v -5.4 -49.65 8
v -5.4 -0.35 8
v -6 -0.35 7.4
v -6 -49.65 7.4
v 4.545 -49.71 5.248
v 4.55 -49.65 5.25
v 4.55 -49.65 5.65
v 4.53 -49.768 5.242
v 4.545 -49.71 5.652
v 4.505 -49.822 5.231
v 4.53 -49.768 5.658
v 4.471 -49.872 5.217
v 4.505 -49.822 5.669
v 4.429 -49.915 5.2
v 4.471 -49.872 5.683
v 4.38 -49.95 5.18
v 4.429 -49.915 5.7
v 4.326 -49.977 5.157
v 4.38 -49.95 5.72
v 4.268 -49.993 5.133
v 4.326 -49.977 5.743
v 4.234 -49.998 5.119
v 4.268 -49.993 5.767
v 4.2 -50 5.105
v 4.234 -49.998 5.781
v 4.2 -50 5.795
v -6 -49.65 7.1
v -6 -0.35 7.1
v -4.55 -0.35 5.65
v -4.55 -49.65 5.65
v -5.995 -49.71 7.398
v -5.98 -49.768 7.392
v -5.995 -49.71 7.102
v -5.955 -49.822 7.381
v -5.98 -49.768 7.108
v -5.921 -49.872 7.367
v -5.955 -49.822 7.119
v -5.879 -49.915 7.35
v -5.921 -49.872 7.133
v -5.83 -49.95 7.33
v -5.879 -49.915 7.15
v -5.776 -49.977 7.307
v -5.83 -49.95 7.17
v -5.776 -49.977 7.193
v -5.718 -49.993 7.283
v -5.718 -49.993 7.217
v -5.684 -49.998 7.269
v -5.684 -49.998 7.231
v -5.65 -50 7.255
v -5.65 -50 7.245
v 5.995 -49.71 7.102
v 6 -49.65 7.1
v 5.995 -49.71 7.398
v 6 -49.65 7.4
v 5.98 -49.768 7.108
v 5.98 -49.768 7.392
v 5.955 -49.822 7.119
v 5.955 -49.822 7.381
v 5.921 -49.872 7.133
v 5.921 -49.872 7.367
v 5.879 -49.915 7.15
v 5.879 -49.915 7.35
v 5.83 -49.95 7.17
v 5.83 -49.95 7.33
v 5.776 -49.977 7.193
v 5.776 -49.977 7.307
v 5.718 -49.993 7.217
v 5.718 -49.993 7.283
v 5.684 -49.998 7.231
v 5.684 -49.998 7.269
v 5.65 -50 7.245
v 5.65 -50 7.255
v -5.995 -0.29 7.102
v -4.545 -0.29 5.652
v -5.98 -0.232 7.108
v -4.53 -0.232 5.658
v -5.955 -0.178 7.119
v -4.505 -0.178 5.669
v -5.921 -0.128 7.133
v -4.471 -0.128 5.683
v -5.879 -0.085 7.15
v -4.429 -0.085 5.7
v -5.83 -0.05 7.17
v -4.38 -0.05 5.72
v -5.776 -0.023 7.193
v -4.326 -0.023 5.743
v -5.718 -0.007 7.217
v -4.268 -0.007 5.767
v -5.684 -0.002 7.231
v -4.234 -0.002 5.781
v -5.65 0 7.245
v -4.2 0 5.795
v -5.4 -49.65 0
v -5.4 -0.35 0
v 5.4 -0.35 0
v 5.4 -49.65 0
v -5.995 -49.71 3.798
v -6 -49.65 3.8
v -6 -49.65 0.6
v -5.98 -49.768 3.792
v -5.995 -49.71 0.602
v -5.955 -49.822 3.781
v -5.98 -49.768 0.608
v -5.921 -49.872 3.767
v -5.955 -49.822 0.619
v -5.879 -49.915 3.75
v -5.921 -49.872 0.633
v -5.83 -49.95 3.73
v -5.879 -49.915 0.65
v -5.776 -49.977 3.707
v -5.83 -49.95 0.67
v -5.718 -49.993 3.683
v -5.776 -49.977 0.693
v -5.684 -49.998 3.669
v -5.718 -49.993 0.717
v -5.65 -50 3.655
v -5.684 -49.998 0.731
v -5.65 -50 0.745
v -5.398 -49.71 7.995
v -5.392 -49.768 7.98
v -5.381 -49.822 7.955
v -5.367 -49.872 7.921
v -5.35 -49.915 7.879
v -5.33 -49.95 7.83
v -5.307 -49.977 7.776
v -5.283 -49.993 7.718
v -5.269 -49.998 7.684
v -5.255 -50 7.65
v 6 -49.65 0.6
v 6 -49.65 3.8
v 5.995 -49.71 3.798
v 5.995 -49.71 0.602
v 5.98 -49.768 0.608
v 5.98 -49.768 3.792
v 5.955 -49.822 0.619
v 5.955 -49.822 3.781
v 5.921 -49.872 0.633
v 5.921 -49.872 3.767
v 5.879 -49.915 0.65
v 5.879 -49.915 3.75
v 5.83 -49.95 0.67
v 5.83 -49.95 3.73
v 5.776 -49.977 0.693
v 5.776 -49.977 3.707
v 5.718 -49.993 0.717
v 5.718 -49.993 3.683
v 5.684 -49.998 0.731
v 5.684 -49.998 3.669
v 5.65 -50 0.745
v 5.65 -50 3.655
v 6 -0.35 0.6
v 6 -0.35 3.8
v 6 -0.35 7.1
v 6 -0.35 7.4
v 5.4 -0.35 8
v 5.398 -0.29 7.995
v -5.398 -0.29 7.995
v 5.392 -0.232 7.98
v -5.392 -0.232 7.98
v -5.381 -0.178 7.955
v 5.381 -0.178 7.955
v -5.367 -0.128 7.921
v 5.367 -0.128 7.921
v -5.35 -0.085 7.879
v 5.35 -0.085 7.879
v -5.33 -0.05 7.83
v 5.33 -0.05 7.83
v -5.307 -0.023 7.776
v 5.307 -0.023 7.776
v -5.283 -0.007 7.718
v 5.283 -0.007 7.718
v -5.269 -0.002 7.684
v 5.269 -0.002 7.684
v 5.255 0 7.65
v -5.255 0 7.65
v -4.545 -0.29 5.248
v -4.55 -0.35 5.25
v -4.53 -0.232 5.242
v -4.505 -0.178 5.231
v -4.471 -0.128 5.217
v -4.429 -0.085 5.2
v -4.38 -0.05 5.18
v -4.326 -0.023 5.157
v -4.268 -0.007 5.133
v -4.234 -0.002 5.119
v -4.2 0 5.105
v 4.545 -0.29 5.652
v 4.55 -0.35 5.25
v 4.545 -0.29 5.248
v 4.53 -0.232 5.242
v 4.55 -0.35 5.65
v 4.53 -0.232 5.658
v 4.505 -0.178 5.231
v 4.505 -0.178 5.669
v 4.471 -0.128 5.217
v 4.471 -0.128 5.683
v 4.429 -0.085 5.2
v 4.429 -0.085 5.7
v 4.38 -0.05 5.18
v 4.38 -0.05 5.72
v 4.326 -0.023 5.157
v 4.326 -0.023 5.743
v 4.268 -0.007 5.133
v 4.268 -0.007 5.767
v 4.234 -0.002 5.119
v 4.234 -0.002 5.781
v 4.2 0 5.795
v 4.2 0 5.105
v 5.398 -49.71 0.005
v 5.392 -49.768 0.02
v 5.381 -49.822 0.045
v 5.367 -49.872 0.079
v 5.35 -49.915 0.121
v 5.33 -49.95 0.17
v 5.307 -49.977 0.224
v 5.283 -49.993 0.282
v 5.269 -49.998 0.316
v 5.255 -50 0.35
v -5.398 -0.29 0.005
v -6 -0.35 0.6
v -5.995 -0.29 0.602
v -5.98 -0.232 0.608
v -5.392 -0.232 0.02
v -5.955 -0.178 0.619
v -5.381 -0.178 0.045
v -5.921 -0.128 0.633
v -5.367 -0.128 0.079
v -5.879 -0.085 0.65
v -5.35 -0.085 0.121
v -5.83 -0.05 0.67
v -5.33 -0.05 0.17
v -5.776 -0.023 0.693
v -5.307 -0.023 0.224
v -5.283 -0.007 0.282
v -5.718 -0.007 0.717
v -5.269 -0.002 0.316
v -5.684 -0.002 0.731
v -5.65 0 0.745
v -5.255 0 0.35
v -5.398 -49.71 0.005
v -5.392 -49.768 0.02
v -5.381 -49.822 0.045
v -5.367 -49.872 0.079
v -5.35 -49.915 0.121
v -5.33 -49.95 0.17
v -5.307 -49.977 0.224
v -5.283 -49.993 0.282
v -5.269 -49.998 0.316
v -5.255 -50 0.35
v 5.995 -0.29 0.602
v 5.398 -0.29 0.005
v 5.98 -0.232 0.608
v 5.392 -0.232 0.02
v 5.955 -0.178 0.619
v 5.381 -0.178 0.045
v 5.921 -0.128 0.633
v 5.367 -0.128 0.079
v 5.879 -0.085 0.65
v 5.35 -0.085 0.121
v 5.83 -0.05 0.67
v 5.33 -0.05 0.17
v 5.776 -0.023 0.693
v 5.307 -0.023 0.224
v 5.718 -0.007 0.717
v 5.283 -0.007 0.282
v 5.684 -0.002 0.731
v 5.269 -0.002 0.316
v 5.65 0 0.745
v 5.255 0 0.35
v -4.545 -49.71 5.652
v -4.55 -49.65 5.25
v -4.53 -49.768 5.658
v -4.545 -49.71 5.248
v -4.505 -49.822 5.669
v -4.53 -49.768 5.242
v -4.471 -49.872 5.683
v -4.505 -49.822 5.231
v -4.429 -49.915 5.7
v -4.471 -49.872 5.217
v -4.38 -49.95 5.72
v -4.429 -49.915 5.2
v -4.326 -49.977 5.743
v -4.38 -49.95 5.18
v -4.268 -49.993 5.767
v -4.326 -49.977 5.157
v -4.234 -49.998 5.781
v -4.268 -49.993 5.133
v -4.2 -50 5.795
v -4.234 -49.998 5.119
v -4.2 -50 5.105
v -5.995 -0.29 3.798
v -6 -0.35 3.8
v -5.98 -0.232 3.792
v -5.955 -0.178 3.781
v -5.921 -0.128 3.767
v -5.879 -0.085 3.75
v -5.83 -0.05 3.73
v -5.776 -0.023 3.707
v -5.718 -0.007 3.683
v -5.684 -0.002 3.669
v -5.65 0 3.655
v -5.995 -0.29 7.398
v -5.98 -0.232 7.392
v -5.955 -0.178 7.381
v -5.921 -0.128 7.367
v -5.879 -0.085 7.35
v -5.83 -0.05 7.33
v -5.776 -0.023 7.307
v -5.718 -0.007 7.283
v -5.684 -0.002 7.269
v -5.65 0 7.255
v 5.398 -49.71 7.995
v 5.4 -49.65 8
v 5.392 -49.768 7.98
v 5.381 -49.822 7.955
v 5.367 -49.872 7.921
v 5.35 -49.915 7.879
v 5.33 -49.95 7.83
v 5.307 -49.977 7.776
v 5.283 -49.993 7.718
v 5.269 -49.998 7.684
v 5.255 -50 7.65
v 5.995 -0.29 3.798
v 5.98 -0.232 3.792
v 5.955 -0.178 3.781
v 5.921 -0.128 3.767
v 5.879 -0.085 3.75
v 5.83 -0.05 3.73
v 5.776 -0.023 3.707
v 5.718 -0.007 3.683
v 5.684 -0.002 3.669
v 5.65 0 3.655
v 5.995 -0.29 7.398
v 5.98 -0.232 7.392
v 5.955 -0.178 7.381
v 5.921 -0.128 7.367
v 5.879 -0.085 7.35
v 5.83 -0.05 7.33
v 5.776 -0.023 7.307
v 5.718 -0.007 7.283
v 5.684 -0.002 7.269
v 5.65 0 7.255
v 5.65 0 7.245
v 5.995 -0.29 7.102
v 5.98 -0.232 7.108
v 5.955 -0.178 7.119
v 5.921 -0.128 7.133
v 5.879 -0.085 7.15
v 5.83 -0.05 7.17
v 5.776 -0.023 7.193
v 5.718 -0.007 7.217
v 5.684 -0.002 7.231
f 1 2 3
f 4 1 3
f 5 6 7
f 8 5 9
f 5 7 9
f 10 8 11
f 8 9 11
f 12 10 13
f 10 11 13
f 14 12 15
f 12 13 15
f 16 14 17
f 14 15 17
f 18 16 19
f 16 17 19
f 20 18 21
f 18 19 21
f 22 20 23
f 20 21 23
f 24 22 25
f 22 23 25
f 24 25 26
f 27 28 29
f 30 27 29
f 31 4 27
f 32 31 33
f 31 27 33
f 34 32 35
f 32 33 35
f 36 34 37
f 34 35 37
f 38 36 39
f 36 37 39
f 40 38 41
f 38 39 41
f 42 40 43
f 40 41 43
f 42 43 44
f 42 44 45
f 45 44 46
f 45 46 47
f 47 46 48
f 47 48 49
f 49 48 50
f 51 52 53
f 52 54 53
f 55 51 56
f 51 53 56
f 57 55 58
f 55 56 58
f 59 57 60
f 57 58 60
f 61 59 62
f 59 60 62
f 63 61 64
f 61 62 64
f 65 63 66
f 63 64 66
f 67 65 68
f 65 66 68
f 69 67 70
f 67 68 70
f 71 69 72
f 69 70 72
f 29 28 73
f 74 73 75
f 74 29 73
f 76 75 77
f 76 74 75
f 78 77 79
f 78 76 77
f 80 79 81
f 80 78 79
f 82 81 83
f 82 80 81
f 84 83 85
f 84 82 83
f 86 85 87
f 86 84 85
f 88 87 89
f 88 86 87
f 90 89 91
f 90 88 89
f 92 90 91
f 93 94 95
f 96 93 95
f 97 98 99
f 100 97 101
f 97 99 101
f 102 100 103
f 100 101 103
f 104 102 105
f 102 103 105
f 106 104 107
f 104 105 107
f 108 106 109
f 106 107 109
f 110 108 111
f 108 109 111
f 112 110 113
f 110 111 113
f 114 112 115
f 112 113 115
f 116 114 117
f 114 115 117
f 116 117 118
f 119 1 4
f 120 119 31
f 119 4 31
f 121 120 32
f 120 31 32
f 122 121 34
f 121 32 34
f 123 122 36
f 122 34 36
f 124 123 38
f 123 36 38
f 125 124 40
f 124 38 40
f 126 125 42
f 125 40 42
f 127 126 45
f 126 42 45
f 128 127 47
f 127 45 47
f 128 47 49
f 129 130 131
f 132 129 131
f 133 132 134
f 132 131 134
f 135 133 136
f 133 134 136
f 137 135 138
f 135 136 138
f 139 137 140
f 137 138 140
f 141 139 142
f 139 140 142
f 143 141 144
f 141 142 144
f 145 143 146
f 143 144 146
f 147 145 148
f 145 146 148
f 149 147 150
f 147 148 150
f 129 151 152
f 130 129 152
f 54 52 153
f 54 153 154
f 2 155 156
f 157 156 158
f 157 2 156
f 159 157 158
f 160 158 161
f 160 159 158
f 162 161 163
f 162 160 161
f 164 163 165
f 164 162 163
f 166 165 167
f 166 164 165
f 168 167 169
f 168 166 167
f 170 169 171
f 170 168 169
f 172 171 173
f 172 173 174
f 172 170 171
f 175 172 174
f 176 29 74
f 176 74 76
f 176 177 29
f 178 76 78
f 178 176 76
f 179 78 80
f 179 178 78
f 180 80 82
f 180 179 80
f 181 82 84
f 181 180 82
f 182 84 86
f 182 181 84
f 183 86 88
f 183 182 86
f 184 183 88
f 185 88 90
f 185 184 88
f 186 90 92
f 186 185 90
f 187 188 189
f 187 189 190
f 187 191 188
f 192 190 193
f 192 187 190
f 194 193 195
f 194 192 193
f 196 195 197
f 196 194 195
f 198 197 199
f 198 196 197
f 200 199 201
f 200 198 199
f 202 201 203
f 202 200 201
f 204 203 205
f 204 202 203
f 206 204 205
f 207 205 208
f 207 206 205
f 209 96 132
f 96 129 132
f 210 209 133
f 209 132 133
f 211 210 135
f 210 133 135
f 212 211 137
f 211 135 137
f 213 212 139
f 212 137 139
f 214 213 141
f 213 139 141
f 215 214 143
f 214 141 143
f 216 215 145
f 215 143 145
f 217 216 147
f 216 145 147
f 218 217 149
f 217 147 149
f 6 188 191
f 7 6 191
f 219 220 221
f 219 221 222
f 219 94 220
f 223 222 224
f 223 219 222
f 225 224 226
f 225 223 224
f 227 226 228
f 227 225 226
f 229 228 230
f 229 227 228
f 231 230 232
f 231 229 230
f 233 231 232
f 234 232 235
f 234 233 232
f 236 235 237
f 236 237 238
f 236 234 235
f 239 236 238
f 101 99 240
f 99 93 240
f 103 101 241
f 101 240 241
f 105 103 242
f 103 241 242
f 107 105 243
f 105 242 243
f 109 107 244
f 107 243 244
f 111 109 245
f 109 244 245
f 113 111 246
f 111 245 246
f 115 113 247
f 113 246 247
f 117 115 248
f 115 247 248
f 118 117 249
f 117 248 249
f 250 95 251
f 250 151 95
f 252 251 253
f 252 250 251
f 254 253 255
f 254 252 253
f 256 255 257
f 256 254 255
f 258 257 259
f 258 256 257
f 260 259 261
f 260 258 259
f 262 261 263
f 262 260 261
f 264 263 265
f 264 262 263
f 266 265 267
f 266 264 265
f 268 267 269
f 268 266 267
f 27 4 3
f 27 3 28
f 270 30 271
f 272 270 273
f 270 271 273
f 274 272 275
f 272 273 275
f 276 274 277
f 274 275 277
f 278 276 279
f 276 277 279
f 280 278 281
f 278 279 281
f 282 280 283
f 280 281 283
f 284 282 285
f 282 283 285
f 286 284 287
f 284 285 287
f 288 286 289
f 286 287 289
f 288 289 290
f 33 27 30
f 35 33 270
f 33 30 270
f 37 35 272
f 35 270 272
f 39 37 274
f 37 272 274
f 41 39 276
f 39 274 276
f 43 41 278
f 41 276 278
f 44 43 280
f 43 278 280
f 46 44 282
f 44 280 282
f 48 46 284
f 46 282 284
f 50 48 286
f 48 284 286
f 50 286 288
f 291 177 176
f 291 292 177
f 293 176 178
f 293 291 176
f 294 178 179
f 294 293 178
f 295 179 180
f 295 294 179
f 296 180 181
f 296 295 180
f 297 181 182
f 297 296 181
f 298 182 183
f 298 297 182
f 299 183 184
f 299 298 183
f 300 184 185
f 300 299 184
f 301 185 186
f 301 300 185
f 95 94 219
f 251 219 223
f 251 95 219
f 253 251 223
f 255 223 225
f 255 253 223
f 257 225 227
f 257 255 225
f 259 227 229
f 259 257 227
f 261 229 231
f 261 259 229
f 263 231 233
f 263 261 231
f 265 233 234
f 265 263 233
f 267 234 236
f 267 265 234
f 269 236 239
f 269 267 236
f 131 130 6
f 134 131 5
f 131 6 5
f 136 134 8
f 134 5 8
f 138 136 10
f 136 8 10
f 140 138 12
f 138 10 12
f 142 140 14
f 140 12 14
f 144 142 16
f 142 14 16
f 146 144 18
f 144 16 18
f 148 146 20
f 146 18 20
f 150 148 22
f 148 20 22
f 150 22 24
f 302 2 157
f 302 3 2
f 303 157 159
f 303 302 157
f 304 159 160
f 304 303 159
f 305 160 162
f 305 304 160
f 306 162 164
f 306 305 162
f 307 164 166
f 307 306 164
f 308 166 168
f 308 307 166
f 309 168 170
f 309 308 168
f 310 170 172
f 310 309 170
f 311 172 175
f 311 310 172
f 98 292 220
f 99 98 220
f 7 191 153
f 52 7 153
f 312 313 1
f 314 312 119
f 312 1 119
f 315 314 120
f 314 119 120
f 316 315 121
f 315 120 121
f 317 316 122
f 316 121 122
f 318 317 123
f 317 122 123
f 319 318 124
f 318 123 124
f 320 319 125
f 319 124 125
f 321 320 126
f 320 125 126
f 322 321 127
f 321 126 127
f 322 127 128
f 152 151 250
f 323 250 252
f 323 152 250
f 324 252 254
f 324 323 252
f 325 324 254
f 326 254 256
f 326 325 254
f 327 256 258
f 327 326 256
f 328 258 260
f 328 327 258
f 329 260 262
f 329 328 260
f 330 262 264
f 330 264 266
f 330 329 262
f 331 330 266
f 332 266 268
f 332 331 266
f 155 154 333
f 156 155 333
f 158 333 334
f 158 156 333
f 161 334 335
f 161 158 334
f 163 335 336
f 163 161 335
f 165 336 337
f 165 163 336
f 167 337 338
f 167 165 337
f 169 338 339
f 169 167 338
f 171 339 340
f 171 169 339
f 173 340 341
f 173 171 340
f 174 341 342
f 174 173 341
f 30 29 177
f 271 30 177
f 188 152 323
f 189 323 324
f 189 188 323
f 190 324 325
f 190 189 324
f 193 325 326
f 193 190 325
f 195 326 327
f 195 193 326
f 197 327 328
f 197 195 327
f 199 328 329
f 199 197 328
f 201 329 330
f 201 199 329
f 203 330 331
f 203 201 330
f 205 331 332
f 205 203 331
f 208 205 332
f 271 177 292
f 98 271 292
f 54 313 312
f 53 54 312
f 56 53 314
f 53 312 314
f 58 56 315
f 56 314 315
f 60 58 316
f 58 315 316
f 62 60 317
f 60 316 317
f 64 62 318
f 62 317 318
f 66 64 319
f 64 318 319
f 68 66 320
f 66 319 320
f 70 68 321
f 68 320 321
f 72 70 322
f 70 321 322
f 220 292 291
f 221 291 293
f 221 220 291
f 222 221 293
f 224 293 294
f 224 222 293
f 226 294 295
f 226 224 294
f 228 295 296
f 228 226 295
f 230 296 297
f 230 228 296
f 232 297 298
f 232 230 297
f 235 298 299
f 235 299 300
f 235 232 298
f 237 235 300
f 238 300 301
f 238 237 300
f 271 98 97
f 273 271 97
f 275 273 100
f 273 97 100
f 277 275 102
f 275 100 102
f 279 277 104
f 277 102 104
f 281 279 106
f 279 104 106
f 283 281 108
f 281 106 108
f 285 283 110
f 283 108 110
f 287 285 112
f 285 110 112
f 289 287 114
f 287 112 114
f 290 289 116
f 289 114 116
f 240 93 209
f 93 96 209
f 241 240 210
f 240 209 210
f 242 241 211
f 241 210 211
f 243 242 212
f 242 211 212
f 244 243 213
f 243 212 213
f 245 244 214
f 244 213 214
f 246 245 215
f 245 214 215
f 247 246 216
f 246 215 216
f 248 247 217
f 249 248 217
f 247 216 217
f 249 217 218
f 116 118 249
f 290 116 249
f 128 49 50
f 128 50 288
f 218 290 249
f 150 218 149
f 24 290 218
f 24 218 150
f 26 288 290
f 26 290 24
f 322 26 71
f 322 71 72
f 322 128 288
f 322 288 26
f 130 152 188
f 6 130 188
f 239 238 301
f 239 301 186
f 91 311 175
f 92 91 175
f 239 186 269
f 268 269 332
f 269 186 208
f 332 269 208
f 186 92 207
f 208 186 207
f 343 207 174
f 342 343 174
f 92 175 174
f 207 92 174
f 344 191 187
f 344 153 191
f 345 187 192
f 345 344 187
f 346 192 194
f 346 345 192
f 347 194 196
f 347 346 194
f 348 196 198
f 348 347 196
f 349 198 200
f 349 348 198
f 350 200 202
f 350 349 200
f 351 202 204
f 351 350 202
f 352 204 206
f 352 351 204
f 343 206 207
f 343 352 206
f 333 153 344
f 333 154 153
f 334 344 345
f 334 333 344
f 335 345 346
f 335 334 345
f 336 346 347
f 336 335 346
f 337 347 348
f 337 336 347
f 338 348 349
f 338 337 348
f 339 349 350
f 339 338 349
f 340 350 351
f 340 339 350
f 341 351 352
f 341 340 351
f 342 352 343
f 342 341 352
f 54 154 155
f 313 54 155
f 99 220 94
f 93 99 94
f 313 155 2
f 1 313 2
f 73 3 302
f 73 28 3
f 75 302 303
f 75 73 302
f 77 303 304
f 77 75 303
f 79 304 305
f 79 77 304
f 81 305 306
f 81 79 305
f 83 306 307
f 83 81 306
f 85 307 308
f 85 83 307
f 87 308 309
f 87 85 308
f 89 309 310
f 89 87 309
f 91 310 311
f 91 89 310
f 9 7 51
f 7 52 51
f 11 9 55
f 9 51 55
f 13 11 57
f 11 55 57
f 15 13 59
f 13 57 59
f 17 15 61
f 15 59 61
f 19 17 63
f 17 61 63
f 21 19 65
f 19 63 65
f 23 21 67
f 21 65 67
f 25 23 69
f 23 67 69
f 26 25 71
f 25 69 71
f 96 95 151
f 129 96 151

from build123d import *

# Parameters (mm, degrees)
PAD_DEPTH = 50
FILLET_R  = 0.35


with BuildPart() as part:
    # Sketch → Pad (new body)
    with BuildSketch(Plane.XZ):
        Polygon((-5.4, 0), (5.4, 0), (6, 0.6), (6, 3.8), (4.55, 5.25), (4.55, 5.65), (6, 7.1), (6, 7.4), (5.4, 8), (-5.4, 8), (-6, 7.4), (-6, 7.1), (-4.55, 5.65), (-4.55, 5.25), (-6, 3.8), (-6, 0.6), align=None)
    extrude(amount=PAD_DEPTH)

    # Fillet
    fillet_edges = [part.edges().sort_by_distance(p)[0] for p in [
        (0, 0, 0),
        (5.7, 0, 0.3),
        (6, 0, 2.2),
        (5.275, 0, 4.525),
        (4.55, 0, 5.45),
        (5.275, 0, 6.375),
        (6, 0, 7.25),
        (5.7, 0, 7.7),
        (0, 0, 8),
        (-5.7, 0, 7.7),
        (-6, 0, 7.25),
        (-5.275, 0, 6.375),
        (-4.55, 0, 5.45),
        (-5.275, 0, 4.525),
        (-6, 0, 2.2),
        (-5.7, 0, 0.3),
        (0, -50, 0),
        (5.7, -50, 0.3),
        (6, -50, 2.2),
        (5.275, -50, 4.525),
        (4.55, -50, 5.45),
        (5.275, -50, 6.375),
        (6, -50, 7.25),
        (5.7, -50, 7.7),
        (0, -50, 8),
        (-5.7, -50, 7.7),
        (-6, -50, 7.25),
        (-5.275, -50, 6.375),
        (-4.55, -50, 5.45),
        (-5.275, -50, 4.525),
        (-6, -50, 2.2),
        (-5.7, -50, 0.3),
    ]]
    fillet(fillet_edges, radius=FILLET_R)


solid = part.part
